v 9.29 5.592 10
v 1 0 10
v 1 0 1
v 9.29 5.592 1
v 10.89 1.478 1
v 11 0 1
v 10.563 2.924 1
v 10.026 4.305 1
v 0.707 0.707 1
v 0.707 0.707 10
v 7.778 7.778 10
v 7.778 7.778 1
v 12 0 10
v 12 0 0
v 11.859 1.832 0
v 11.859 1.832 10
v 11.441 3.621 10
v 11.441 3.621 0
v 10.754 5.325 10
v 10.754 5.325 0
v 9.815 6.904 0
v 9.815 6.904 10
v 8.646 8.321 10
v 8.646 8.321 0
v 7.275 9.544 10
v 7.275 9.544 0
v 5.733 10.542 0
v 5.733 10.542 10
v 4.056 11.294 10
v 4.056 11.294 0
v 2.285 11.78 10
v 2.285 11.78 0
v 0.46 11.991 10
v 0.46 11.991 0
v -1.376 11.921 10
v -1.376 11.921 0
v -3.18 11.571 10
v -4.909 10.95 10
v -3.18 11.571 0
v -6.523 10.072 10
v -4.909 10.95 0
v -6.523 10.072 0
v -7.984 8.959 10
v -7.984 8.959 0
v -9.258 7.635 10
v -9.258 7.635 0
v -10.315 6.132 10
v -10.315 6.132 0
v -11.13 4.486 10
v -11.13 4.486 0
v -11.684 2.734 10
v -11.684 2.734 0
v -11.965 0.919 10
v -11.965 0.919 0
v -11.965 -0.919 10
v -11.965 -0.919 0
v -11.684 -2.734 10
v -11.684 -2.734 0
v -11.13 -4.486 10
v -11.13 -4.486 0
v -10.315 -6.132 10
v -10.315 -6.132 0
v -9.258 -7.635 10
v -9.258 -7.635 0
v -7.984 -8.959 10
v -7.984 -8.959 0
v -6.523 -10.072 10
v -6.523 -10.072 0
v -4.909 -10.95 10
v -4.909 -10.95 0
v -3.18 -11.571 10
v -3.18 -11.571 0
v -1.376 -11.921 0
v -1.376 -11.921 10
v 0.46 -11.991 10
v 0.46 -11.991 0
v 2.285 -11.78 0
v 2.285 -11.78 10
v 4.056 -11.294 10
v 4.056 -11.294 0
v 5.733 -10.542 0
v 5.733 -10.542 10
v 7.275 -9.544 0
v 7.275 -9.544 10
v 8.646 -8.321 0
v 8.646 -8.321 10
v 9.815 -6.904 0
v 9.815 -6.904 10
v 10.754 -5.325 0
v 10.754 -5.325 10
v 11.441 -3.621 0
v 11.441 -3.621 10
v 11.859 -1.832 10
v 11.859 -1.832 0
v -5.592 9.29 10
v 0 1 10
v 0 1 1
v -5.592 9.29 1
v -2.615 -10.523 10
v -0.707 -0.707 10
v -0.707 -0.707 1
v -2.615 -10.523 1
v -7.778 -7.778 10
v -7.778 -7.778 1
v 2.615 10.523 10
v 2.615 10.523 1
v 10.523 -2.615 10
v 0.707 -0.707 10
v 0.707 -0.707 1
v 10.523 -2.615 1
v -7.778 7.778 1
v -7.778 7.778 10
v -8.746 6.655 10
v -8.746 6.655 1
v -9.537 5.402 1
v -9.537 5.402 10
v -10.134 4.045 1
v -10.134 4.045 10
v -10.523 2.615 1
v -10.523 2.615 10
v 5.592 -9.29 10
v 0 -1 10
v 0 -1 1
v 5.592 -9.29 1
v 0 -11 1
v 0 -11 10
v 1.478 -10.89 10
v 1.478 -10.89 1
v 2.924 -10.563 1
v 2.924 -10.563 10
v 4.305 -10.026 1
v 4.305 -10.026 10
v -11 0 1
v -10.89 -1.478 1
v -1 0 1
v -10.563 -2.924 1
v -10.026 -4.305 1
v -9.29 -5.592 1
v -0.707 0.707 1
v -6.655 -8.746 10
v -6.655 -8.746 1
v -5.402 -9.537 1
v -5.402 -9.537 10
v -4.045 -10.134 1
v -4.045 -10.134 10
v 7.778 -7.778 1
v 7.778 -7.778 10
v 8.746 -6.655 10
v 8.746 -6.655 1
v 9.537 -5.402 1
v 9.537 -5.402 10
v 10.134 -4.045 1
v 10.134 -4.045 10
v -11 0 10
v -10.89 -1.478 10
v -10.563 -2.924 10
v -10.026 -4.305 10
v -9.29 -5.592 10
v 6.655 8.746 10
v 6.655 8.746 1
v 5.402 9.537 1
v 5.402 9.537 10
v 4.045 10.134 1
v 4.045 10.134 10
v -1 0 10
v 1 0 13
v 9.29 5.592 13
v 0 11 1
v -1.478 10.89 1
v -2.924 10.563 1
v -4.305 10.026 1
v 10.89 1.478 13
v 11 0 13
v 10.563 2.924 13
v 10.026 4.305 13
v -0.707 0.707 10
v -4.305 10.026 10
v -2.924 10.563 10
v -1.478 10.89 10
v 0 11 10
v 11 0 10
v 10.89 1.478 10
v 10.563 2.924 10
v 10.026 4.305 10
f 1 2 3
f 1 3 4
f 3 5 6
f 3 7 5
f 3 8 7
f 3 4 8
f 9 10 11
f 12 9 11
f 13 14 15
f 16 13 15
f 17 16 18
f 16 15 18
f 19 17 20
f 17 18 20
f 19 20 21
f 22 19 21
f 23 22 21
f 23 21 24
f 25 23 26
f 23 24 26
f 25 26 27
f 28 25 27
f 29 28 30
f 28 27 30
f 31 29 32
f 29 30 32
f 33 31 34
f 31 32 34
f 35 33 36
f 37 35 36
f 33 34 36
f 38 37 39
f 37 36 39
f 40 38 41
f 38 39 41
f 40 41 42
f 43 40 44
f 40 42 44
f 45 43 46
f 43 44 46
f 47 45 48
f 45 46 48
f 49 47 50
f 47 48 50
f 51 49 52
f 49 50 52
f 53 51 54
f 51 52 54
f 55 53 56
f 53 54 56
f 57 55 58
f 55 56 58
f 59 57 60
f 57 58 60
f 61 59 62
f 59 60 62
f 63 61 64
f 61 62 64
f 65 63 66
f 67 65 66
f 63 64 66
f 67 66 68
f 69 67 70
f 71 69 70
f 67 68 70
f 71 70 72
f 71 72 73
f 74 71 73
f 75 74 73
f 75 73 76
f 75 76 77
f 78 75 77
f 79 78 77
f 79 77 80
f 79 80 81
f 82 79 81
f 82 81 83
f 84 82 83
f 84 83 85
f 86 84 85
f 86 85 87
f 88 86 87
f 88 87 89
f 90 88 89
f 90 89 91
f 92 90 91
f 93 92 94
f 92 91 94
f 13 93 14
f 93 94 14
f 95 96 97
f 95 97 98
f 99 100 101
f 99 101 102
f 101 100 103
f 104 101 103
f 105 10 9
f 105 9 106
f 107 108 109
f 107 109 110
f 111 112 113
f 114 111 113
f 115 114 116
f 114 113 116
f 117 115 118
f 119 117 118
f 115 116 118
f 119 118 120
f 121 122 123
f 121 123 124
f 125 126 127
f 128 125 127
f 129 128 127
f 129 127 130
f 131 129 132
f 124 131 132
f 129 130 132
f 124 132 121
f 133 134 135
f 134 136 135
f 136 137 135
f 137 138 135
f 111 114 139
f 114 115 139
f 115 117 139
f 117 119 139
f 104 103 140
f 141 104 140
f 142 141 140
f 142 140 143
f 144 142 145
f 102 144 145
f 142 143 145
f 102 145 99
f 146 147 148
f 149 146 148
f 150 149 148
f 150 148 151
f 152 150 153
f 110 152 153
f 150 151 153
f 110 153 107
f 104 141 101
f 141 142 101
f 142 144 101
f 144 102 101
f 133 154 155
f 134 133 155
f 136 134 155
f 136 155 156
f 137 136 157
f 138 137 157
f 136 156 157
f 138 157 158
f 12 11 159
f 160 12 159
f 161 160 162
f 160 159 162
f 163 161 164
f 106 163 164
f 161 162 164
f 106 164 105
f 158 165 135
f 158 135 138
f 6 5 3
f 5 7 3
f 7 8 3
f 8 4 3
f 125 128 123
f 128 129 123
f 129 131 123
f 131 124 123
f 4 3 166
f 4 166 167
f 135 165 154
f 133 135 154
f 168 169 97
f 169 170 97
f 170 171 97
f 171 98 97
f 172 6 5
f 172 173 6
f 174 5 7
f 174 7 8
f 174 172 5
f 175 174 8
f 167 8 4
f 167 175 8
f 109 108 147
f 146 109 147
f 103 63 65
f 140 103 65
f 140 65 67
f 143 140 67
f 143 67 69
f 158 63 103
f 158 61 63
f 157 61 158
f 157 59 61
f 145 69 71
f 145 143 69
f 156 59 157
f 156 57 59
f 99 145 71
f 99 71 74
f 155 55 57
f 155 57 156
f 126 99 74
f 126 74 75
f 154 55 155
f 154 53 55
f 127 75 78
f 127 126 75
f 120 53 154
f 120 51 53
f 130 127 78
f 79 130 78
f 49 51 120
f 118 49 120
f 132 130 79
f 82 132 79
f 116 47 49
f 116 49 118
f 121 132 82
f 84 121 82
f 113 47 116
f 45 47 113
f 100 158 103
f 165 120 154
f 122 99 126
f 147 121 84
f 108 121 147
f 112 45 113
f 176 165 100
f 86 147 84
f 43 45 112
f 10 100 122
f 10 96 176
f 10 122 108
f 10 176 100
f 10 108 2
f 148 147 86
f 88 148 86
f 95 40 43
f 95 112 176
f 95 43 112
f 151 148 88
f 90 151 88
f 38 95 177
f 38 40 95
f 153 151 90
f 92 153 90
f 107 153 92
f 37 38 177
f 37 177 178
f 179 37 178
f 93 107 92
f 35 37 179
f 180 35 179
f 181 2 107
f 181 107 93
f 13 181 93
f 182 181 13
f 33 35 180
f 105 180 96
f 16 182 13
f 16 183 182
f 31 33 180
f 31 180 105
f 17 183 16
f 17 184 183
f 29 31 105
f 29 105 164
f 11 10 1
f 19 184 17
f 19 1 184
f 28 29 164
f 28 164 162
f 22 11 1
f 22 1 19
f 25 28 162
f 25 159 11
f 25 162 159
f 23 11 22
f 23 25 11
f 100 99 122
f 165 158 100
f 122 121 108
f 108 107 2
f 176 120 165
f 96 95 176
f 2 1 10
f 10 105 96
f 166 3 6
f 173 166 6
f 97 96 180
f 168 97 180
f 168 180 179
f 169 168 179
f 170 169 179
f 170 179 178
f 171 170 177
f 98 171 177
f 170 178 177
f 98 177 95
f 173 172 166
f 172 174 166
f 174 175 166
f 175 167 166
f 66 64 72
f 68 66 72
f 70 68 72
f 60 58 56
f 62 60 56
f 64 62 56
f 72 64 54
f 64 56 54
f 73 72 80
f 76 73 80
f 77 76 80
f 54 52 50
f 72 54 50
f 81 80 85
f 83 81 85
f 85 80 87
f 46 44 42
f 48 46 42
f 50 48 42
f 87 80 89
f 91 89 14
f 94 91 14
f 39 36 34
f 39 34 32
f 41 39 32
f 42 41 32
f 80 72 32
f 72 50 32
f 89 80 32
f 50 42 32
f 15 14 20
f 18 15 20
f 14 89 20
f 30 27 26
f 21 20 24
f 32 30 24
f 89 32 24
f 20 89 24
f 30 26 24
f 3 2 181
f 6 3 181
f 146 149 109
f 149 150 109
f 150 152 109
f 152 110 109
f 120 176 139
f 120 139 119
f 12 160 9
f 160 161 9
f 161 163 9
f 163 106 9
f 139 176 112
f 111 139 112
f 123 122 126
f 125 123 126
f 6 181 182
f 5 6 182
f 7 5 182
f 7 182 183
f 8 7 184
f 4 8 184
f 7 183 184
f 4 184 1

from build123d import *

# Parameters (mm, degrees)
CYLINDER001_W     = 10
CYLINDER001_H     = 12
CYLINDER001_ANGLE = 34
ARRAY_COUNT       = 8
CYLINDER_R        = 12
CYLINDER_DEPTH    = 10
CYLINDER002_W     = 10
CYLINDER002_H     = 12
CYLINDER002_ANGLE = 34


with BuildPart() as array:
    # Cylinder001 → Cylinder001 (revolve)
    with BuildSketch(Plane(origin=(1, 0, 1), x_dir=(1, 0, 0), z_dir=(0, -1, 0))):
        with Locations((5, 6)):
            Rectangle(CYLINDER001_W, CYLINDER001_H)
    revolve(axis=Axis((1, 0, 1), (0, 0, 1)), revolution_arc=CYLINDER001_ANGLE)

    # Array: Array ×8 about axis
    array_axis = Axis((0, 0, 0), (0, 0, 1))


with BuildPart() as array_1:
    add(array.part)
    for i in range(1, ARRAY_COUNT):
        add(array.part.rotate(array_axis, i * 360 / ARRAY_COUNT))


with BuildPart() as cut:
    # Cylinder → Cylinder (new body)
    with BuildSketch(Plane.XY):
        Circle(CYLINDER_R)
    extrude(amount=CYLINDER_DEPTH)

    # Cut: cut Array
    add(array_1.part, mode=Mode.SUBTRACT)


with BuildPart() as cylinder002:
    # Cylinder002 → Cylinder002 (revolve)
    with BuildSketch(Plane(origin=(1, 0, 1), x_dir=(1, 0, 0), z_dir=(0, -1, 0))):
        with Locations((5, 6)):
            Rectangle(CYLINDER002_W, CYLINDER002_H)
    revolve(axis=Axis((1, 0, 1), (0, 0, 1)), revolution_arc=CYLINDER002_ANGLE)


solid = Compound([cut.part, cylinder002.part])
